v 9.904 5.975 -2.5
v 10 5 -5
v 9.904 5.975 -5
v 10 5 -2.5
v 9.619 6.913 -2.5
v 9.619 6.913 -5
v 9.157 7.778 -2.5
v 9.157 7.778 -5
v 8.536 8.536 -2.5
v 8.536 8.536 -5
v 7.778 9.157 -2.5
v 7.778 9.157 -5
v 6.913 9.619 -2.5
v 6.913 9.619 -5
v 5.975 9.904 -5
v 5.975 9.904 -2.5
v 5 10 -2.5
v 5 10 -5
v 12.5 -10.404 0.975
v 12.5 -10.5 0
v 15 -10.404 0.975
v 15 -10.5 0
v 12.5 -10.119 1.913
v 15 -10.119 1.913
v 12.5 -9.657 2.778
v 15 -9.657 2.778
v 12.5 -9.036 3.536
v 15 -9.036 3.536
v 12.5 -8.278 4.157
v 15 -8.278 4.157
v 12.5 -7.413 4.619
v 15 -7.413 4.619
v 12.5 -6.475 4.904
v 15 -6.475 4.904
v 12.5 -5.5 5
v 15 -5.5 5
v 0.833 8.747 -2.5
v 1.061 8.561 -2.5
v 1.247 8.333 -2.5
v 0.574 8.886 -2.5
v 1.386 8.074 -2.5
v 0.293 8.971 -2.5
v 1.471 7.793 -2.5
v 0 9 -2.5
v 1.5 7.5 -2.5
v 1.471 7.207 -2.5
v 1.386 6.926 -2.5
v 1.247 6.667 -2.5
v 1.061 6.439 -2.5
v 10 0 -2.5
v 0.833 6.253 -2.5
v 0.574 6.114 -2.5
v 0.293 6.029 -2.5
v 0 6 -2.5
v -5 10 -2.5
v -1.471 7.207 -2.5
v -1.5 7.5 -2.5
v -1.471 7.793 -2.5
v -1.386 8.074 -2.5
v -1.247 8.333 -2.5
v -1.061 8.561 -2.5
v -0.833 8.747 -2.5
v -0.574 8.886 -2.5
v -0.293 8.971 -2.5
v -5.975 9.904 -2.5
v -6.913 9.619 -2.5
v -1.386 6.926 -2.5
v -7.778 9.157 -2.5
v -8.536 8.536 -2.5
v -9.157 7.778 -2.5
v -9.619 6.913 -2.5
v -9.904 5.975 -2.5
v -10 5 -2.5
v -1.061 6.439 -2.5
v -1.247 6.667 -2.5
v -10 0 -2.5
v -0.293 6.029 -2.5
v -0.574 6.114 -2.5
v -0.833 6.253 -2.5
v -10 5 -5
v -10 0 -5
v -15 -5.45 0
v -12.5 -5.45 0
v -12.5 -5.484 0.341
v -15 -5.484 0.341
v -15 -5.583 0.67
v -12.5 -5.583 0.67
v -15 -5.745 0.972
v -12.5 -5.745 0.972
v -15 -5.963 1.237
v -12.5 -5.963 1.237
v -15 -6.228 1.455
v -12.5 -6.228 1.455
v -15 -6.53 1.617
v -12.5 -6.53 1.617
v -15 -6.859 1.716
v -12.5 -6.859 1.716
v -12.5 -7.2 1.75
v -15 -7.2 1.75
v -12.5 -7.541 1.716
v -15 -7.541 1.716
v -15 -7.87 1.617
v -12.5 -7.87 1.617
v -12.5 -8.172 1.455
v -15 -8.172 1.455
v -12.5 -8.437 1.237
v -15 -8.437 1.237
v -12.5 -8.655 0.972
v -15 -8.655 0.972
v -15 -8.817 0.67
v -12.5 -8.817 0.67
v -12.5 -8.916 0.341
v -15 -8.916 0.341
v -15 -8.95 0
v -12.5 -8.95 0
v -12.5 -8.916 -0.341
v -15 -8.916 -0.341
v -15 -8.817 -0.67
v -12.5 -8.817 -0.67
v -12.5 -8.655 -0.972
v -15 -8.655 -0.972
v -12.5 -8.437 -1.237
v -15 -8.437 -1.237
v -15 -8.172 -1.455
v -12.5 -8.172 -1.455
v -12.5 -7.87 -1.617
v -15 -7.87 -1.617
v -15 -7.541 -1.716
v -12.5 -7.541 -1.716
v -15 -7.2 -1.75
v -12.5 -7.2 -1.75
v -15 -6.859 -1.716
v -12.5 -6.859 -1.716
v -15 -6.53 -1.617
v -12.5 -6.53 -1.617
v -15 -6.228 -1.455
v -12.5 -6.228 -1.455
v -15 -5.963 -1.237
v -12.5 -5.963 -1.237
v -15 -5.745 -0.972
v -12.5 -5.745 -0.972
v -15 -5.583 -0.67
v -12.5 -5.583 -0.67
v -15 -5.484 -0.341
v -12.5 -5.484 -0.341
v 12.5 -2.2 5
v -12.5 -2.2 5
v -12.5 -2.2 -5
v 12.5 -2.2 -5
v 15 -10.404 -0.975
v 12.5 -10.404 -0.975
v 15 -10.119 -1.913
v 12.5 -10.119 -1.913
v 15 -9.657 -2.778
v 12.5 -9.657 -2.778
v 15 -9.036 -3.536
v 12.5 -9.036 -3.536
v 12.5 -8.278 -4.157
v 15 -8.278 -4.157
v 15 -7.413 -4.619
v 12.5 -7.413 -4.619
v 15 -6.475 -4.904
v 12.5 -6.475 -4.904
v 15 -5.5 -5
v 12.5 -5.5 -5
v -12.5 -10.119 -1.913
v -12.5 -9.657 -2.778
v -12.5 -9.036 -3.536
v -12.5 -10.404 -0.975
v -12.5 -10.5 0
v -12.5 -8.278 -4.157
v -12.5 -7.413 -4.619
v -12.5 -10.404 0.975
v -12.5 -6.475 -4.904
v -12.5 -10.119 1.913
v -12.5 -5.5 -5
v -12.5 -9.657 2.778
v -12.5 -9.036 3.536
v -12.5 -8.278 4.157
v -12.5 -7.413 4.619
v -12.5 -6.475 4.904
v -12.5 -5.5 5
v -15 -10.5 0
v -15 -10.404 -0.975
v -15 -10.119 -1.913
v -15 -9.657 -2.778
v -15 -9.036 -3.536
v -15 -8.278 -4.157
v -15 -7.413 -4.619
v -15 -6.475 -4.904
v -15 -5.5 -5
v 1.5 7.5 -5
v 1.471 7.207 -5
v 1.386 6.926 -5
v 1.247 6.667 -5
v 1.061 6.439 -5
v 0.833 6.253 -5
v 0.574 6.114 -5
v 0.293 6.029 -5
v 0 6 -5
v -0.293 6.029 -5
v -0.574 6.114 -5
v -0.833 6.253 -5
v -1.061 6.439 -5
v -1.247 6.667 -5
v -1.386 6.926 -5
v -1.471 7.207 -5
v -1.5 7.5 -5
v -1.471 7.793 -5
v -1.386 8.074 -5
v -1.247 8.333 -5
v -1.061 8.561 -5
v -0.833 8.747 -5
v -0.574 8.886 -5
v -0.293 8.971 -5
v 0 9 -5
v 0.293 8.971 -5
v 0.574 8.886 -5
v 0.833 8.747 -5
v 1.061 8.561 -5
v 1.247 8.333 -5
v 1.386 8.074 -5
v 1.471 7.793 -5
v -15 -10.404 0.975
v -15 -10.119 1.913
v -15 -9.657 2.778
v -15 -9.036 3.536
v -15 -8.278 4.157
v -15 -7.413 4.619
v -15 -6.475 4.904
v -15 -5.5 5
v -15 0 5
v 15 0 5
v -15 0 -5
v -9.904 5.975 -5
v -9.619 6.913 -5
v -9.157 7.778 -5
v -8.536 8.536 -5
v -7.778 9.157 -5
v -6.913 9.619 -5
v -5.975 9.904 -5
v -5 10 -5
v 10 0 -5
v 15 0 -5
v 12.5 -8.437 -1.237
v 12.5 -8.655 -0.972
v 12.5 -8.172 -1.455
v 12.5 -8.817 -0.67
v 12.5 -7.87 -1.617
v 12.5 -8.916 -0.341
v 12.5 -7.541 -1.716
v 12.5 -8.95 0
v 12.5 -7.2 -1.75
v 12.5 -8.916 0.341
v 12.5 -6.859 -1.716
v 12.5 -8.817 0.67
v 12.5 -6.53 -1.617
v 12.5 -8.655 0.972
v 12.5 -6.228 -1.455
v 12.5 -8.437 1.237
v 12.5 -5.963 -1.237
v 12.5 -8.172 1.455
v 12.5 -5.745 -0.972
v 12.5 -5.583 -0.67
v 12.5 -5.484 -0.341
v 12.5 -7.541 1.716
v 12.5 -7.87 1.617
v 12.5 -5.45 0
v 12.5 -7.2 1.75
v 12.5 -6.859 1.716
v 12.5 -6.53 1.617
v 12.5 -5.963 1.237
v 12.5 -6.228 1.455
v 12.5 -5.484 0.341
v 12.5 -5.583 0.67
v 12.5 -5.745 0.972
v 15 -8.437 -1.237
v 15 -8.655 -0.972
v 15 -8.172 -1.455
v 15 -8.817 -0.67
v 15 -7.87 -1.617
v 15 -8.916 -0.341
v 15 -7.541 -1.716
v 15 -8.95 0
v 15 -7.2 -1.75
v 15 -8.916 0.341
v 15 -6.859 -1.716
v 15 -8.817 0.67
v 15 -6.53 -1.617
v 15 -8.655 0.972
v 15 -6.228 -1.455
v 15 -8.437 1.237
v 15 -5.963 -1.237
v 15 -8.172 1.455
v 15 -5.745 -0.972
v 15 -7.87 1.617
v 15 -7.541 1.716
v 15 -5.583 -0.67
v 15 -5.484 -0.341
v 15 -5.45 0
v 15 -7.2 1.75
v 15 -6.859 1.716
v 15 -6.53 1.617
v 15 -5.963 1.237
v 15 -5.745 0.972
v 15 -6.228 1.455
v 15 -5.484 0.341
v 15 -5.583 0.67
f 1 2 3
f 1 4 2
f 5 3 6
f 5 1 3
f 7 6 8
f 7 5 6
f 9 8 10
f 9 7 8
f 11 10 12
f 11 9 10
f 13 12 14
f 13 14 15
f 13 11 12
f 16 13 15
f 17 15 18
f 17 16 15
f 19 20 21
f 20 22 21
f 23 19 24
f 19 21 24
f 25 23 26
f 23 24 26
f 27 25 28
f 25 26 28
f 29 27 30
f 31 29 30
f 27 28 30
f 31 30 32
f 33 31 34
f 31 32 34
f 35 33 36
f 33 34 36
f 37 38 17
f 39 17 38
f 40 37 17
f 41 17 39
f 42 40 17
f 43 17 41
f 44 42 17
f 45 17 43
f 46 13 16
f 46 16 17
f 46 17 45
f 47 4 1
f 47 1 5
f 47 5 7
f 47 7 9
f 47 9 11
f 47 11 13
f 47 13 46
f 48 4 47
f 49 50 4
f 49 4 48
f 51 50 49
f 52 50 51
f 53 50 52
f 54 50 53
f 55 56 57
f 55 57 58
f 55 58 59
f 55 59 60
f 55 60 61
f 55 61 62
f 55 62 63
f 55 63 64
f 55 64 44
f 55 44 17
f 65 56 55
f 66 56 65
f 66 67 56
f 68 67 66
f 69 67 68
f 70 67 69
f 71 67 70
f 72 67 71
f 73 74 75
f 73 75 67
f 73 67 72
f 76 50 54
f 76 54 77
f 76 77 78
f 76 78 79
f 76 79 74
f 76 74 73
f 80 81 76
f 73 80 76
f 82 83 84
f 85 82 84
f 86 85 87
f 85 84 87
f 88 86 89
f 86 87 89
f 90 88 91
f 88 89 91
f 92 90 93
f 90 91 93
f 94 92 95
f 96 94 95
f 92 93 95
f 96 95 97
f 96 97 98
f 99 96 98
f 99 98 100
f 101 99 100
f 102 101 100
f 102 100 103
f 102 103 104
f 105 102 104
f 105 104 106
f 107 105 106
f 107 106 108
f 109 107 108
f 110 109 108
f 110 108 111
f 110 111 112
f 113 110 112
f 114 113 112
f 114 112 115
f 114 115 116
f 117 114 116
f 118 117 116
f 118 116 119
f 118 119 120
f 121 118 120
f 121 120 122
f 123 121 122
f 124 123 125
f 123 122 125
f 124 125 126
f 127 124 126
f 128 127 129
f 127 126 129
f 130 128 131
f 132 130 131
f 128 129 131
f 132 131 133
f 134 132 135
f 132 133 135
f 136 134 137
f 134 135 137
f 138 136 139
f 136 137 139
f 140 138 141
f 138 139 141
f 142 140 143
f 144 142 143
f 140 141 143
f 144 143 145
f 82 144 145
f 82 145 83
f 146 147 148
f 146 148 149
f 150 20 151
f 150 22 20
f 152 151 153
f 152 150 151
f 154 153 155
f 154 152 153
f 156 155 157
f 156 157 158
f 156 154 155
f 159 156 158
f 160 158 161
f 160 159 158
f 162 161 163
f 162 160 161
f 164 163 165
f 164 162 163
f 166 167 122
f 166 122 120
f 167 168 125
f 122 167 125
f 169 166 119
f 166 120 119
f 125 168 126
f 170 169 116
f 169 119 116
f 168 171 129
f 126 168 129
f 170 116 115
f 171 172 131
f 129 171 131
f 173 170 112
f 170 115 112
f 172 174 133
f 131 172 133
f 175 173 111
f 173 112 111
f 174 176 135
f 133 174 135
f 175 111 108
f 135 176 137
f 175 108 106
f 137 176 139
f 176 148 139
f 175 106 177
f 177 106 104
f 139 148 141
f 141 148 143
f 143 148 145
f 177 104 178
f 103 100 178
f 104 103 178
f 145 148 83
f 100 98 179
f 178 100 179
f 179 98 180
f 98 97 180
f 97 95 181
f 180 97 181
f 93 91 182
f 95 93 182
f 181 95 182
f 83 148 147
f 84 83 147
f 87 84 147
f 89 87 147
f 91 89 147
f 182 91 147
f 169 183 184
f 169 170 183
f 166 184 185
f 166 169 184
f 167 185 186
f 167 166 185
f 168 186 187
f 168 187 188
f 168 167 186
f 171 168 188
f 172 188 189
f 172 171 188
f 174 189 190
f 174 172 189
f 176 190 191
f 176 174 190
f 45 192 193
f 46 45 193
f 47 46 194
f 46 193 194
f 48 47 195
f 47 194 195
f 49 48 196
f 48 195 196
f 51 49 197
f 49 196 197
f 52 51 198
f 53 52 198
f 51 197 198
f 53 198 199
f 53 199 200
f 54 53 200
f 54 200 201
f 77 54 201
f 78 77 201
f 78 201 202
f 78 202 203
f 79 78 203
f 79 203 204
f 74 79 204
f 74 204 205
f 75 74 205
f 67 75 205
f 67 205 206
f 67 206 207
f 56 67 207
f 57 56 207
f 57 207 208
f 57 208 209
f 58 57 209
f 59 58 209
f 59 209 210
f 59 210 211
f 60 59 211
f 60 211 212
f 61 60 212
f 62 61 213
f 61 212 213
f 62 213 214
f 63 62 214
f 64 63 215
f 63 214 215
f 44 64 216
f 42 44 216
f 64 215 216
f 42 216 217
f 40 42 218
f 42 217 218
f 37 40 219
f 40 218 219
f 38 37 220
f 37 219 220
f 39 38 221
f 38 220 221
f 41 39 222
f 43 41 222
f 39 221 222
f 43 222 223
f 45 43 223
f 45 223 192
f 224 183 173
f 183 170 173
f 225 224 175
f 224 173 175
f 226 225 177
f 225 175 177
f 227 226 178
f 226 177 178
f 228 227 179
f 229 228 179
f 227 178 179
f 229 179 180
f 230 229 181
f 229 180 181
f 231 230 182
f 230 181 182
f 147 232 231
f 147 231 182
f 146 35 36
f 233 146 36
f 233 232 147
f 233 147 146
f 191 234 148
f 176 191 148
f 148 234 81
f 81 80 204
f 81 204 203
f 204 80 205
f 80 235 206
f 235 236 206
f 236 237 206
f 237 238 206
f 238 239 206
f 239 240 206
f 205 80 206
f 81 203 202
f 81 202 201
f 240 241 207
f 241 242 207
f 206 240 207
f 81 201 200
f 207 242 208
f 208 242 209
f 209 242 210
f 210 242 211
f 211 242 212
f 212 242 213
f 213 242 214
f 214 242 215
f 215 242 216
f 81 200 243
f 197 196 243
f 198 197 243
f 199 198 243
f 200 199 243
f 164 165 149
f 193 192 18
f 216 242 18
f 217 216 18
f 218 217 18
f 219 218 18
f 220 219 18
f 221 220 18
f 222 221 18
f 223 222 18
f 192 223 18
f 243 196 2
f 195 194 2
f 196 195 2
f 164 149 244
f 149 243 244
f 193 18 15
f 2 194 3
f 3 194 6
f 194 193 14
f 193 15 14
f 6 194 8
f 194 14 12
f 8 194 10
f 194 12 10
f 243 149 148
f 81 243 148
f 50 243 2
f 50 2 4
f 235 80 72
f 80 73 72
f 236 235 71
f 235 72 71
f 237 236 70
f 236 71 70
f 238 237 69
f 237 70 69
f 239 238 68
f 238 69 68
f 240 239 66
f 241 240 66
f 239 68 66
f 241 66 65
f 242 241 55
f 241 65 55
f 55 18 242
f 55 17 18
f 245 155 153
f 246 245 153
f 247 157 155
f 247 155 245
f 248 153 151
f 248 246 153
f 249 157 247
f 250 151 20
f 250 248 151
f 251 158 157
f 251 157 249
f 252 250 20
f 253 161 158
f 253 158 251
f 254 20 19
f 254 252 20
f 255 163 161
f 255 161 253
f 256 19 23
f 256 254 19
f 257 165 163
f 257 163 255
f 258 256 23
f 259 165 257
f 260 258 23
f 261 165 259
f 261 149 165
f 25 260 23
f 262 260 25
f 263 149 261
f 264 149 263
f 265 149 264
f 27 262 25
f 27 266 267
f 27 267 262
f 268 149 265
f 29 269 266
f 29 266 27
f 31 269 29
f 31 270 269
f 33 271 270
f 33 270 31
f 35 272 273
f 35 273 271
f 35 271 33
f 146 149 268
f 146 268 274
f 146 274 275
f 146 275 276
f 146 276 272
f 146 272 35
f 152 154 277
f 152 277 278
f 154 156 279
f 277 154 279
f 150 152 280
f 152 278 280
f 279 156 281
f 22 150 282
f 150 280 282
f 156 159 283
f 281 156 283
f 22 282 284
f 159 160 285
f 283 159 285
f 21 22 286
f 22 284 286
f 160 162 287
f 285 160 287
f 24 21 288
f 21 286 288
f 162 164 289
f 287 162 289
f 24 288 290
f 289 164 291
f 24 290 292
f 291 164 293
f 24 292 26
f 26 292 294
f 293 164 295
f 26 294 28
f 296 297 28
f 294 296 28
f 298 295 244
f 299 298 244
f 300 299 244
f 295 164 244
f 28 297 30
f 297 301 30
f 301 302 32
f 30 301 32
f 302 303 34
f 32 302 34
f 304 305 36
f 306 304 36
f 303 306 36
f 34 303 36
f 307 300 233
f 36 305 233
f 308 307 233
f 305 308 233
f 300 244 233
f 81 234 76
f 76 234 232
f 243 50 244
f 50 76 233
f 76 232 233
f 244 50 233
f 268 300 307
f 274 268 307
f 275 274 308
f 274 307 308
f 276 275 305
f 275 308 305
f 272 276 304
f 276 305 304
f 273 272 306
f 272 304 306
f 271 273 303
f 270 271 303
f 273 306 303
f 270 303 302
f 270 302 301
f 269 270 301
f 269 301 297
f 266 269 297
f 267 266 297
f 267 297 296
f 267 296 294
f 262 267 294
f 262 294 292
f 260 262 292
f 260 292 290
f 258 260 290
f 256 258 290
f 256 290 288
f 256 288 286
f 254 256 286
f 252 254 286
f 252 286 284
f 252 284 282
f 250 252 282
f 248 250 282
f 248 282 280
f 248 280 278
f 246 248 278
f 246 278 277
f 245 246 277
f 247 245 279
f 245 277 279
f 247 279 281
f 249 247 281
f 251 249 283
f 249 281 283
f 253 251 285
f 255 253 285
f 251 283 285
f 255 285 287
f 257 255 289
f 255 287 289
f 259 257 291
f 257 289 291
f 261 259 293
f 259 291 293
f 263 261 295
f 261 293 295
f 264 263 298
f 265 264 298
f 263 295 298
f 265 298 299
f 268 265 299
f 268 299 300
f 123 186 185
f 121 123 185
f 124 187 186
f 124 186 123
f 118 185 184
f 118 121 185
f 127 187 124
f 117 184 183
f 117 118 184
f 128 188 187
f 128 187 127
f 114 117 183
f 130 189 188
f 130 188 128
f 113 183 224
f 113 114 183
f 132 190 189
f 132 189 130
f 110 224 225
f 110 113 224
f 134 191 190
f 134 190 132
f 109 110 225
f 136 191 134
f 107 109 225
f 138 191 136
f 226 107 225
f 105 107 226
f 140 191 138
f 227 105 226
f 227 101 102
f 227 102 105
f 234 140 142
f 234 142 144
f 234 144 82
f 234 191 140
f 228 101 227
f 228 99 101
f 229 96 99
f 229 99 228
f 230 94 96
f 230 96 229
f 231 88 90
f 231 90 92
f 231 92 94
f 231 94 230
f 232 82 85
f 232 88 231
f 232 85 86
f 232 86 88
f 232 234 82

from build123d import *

# Parameters (mm, degrees)
F0_W      = 25
F0_H      = 10
F1_DEPTH  = 2.2
F0_W_2    = 2.5
F2_DEPTH  = 10.5
F3_R      = 4.99999
F4_R      = 1.75
F5_DEPTH  = 35
F6_W      = 20
F6_H      = 2.5
F7_DEPTH  = 10
F8_R      = 5
F9_R      = 1.5
F10_DEPTH = 25


# Not quite as in the source:
# - a fillet or chamfer is up to 0.001 mm smaller than in the source, because OpenCascade refuses the exact size


with BuildPart() as f1:
    # F0 (on Front) → F1 (new body)
    with BuildSketch(Plane.XZ):
        Rectangle(F0_W, F0_H)
    extrude(amount=F1_DEPTH)

    # F0 (on Front) → F2 (join)
    with BuildSketch(Plane.XZ):
        with Locations((-13.75, 0)):
            Rectangle(F0_W_2, F0_H)
        with Locations((13.75, 0)):
            Rectangle(F0_W_2, F0_H)
    extrude(amount=F2_DEPTH)

    # F3 (radius 5 in the source; OpenCascade refuses exactly that, so slightly less here)
    f3_edges = [f1.edges().sort_by_distance(p)[0] for p in [
        (13.75, -10.5, 5),
        (13.75, -10.5, -5),
        (-13.75, -10.5, -5),
        (-13.75, -10.5, 5),
    ]]
    fillet(f3_edges, radius=F3_R)

    # F4 (on face) → F5 (cut)
    with BuildSketch(Plane.YZ.offset(15)):
        with Locations((-7.2, 0)):
            Circle(F4_R)
    extrude(amount=-F5_DEPTH, mode=Mode.SUBTRACT)

    # F6 (on face) → F7 (join)
    with BuildSketch(Plane(origin=(0, 0, 0), x_dir=(-1, 0, 0), z_dir=(0, 1, 0))):
        with Locations((0, -3.75)):
            Rectangle(F6_W, F6_H)
    extrude(amount=F7_DEPTH)

    # F8
    f8_edges = [f1.edges().sort_by_distance(p)[0] for p in [
        (10, 10, -3.75),
        (-10, 10, -3.75),
    ]]
    fillet(f8_edges, radius=F8_R)

    # F9 (on face) → F10 (cut)
    with BuildSketch(Plane(origin=(0, 0, -5), x_dir=(1, 0, 0), z_dir=(0, 0, -1))):
        with Locations((0, -7.5)):
            Circle(F9_R)
    extrude(amount=-F10_DEPTH, mode=Mode.SUBTRACT)


solid = f1.part
